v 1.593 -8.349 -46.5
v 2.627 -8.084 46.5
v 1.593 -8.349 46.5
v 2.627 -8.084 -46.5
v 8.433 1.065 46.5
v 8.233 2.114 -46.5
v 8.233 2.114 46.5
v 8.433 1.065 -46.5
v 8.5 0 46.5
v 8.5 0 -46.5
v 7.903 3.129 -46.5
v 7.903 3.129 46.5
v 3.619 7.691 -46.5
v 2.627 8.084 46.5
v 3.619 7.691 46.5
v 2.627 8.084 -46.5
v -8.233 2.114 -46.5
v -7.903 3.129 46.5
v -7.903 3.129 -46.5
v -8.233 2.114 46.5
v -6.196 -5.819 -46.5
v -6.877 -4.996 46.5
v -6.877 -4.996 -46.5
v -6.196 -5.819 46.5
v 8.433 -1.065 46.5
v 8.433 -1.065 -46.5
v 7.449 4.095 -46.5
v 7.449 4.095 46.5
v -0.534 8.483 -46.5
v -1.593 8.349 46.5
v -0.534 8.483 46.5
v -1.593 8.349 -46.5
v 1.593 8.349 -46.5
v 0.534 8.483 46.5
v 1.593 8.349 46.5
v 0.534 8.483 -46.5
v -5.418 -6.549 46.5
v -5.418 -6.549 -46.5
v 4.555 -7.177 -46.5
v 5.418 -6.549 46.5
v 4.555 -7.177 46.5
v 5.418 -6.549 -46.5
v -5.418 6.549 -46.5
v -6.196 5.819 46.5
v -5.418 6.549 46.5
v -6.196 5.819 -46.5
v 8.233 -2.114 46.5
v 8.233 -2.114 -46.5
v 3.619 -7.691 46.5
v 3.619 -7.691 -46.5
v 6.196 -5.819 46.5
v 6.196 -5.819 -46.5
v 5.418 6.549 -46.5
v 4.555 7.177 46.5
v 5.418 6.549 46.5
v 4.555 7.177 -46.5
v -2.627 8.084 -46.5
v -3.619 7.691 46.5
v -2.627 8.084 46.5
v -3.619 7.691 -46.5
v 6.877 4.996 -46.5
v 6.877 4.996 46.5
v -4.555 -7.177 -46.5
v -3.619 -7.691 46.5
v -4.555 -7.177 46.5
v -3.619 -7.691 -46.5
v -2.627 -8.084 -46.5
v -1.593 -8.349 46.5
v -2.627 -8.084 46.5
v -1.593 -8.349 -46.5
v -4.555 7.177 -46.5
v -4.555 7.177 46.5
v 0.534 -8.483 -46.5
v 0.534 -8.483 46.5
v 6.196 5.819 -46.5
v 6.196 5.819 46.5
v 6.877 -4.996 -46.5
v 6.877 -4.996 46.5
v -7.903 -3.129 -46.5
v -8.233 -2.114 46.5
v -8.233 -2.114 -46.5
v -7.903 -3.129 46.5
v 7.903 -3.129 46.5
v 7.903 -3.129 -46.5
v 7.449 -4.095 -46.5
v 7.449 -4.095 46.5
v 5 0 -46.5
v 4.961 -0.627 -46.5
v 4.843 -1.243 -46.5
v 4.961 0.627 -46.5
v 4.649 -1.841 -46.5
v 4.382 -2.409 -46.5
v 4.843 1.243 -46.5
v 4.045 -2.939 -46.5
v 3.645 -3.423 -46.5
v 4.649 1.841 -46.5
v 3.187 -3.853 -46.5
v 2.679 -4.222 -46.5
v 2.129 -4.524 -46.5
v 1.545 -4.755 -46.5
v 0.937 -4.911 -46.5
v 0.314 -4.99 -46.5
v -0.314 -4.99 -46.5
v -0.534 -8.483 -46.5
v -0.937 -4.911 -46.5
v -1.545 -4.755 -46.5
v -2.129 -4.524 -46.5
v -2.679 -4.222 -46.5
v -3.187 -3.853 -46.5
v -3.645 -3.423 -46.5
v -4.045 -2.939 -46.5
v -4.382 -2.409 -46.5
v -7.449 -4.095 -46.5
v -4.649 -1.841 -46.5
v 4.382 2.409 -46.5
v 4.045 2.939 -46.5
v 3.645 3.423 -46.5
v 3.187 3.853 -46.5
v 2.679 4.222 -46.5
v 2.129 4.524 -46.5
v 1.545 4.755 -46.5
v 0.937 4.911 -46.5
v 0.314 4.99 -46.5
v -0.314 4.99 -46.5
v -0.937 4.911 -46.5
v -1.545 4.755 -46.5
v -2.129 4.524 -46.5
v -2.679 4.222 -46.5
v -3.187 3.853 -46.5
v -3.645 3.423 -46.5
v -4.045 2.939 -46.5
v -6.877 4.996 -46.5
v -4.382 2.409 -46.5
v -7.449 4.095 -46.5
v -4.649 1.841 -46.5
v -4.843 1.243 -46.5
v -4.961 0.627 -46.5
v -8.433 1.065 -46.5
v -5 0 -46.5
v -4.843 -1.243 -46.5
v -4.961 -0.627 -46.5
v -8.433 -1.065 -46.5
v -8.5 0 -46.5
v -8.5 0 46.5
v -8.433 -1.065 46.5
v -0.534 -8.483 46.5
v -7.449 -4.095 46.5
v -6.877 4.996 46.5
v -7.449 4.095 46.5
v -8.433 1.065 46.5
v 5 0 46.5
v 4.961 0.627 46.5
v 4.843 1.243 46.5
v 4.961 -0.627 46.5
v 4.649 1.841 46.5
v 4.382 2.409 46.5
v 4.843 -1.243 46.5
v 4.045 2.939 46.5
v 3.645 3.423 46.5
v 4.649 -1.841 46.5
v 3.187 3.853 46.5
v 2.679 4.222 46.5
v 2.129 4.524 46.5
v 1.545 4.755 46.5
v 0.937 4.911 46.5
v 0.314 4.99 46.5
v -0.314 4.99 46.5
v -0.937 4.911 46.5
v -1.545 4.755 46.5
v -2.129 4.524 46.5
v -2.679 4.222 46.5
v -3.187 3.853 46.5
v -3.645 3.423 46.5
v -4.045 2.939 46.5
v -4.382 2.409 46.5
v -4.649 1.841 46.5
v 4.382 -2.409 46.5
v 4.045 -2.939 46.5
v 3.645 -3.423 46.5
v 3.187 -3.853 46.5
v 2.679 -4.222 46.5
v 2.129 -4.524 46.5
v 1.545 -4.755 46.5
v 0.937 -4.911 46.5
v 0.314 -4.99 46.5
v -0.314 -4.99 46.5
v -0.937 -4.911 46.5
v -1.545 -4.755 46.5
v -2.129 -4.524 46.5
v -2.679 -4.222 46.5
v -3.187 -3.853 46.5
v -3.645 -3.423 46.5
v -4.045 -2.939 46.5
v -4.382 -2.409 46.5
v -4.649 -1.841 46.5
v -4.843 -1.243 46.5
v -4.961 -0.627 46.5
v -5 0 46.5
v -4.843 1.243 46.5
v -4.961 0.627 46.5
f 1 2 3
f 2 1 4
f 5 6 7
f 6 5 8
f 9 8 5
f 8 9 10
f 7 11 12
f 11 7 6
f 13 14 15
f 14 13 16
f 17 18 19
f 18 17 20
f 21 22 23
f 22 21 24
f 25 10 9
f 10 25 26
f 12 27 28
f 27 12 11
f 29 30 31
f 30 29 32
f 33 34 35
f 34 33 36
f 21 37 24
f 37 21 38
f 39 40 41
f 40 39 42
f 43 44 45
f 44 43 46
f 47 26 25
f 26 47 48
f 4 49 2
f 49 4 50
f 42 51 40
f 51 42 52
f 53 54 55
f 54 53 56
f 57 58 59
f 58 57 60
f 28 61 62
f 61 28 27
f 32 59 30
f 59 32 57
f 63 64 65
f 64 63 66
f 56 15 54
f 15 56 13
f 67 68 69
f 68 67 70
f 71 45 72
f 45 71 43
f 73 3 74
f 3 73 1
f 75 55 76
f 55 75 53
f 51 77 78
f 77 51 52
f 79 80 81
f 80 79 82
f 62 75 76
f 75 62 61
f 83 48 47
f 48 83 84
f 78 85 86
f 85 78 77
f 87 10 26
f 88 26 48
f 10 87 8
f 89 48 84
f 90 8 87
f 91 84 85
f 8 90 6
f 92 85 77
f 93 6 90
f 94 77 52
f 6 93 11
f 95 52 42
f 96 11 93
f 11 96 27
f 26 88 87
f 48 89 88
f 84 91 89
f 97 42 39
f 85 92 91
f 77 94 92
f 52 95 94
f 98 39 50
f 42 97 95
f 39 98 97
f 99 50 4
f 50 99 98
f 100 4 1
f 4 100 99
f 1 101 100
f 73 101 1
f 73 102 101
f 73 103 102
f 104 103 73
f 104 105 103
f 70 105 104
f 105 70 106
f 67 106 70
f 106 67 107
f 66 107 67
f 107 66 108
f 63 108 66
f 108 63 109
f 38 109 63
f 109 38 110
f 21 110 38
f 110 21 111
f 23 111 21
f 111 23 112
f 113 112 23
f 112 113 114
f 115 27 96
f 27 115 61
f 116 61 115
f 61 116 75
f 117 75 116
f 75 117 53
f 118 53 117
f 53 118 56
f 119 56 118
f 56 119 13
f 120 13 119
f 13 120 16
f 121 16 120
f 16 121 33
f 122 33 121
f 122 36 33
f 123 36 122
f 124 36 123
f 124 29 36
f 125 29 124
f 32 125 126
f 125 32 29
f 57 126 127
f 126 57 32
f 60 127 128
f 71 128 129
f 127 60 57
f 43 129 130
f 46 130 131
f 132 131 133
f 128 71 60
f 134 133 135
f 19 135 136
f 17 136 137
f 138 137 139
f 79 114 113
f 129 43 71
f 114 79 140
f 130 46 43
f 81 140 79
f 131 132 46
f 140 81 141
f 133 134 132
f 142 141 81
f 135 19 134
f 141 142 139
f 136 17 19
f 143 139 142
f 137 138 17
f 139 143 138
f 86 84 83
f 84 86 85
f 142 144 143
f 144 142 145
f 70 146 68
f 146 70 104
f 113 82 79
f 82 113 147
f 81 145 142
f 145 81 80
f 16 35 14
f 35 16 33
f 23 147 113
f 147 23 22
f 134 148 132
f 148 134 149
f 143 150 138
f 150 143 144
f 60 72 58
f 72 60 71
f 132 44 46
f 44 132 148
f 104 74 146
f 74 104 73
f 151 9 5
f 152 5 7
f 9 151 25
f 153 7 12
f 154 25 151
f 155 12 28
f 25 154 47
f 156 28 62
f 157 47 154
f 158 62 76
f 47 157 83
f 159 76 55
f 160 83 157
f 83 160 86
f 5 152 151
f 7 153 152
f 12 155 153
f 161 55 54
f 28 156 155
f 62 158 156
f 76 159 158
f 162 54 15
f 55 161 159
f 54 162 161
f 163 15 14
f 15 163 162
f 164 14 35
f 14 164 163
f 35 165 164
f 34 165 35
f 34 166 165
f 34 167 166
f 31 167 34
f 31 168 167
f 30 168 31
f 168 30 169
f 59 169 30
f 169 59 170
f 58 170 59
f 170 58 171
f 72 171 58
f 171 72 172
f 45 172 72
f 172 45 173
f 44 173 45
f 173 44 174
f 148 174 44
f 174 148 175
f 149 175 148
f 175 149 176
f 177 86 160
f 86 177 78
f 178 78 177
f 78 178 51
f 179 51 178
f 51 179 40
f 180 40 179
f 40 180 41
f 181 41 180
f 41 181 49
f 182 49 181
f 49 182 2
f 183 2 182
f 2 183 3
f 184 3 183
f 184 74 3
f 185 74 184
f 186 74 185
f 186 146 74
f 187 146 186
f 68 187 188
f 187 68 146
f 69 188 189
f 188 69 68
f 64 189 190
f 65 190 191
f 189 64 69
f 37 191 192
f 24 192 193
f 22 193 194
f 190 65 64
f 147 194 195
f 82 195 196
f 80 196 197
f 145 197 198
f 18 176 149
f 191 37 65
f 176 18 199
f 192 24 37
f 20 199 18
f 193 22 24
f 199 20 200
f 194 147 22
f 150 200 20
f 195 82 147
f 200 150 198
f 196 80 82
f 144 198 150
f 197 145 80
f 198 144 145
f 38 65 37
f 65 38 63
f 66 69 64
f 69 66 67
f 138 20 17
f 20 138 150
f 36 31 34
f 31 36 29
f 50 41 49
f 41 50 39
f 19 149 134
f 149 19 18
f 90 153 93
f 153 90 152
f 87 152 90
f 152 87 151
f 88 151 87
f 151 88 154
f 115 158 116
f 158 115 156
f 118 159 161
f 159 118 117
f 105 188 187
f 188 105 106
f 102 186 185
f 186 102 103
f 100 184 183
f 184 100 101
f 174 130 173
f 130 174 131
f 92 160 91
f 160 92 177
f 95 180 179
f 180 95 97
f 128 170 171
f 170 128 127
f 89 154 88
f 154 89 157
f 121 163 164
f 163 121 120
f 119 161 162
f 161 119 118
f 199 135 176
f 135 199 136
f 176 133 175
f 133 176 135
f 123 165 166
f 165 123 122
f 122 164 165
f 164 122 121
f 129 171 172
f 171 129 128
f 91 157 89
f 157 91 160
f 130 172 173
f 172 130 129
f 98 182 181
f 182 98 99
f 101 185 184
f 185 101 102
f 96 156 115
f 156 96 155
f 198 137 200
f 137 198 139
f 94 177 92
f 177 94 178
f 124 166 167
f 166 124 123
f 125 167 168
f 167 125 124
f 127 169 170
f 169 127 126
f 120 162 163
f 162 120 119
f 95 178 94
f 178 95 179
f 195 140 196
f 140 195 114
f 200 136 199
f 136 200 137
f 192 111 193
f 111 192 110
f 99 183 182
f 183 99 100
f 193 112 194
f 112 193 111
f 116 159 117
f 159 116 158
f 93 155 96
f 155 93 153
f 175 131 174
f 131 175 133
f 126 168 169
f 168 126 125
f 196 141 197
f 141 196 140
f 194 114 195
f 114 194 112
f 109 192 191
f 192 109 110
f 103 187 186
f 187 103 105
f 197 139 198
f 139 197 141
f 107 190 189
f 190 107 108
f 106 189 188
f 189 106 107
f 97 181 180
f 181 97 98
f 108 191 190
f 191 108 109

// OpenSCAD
$fn = 50;


difference() {
	union() {
		translate(v = [0, 0, -46.5000000000]) {
			cylinder(h = 93, r = 8.5000000000);
		}
	}
	union() {
		translate(v = [0, 0, -100.0000000000]) {
			cylinder(h = 200, r = 5.0000000000);
		}
	}
}
